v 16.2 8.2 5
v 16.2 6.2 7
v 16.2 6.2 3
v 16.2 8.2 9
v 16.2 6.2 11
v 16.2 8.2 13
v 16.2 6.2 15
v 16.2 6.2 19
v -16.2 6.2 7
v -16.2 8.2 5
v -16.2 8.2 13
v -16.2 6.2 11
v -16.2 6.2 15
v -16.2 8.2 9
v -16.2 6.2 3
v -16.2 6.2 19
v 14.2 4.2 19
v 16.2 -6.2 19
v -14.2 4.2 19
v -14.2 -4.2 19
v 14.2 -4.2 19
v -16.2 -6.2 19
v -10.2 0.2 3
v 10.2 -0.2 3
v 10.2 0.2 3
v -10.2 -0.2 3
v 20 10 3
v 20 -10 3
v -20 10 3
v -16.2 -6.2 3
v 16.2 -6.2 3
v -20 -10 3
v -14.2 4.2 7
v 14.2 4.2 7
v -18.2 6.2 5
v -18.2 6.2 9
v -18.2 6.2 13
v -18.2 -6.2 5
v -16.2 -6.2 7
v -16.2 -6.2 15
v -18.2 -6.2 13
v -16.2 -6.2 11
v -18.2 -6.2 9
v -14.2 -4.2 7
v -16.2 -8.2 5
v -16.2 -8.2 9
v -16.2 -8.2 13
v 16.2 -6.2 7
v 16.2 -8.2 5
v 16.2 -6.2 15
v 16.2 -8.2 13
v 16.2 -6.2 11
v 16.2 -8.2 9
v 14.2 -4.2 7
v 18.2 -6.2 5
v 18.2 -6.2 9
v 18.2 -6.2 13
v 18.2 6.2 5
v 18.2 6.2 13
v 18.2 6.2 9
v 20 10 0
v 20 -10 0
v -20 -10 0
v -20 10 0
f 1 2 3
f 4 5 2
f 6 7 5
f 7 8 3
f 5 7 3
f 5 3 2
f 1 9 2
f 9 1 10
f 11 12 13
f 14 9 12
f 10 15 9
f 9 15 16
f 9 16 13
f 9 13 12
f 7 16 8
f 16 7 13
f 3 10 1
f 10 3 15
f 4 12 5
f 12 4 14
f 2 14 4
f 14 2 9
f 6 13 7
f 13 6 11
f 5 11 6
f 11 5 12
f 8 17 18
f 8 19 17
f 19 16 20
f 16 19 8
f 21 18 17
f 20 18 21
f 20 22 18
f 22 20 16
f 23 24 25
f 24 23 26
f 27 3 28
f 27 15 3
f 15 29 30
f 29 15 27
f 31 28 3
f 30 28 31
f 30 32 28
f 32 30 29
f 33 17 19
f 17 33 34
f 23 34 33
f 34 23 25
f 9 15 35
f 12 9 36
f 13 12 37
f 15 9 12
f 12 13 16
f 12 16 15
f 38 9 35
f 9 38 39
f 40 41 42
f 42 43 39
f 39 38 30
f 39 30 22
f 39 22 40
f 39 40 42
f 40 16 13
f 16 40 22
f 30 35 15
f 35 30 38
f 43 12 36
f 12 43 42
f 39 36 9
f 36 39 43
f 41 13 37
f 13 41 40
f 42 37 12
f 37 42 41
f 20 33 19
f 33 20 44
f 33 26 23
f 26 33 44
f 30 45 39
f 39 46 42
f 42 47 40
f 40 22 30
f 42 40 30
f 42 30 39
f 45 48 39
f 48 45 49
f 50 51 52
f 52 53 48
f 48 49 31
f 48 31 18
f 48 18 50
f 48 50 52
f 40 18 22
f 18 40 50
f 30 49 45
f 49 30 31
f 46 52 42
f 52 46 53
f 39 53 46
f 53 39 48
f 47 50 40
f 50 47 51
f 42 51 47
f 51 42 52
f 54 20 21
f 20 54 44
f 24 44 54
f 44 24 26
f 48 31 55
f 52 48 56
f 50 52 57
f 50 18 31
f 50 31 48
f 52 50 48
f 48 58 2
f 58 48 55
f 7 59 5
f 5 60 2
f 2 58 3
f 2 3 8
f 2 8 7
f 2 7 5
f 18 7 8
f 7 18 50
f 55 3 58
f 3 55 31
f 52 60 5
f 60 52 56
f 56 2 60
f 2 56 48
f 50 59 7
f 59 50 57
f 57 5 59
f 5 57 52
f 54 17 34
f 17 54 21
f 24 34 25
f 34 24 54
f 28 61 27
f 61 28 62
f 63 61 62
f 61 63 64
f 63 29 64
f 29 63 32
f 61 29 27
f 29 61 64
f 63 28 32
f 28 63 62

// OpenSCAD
//EndCap_Print();
AluX = 40;
AluY = 20;
AluThickness = 1.8;
EndCapGraps = 3;
EndCapWallThickness = 2;
EndCapThickness = 3;



_WallLengthX = AluX-2*AluThickness-2*EndCapWallThickness;
_WallLengthY = AluY-2*AluThickness-2*EndCapWallThickness;


_Height = (EndCapGraps+1)*2*EndCapWallThickness;

EndCap_Print();

module EndCap()
{
	translate([0,0,-EndCapThickness])
	EndCap_Print();
}


module EndCap_Print()
{
	difference()
	{
		union()
		{
			//Bottom
			translate([0,0,0.5*EndCapThickness])
			cube([AluX, AluY, EndCapThickness], center=true);
			//Walls
            
			rotate([0,0,0*90])
            translate([	0,
                        0.5*AluY-2*EndCapWallThickness-AluThickness,
                        EndCapThickness])
            _wall(_WallLengthX);
            rotate([0,0,1*90])
            translate([	0,
                        0.5*AluX-2*EndCapWallThickness-AluThickness,
                        EndCapThickness])
            _wall(_WallLengthY);
            rotate([0,0,2*90])
            translate([	0,
                        0.5*AluY-2*EndCapWallThickness-AluThickness,
                        EndCapThickness])
            _wall(_WallLengthX);
            rotate([0,0,3*90])
            translate([	0,
                        0.5*AluX-2*EndCapWallThickness-AluThickness,
                        EndCapThickness])
            _wall(_WallLengthY); 
		}/*
		union()
		{
			_EndCapCut(AluX,AluY);
			rotate([0,0,90])
			_EndCapCut(AluY,AluX);
		}*/
	}
}

module _wall(length)
{
	//translate([	0,
	//				0.5*AluWidth-2*EndCapWallThickness-AluThickness,
	//				EndCapThickness])
	union()
	{
		translate([-0.5*length,0,0])
		cube([length, EndCapWallThickness, _Height]);
		_support(length);
		for ( i = [0 : EndCapGraps-1] )
		{
			  translate([0,0,i*2*EndCapWallThickness]) _wedge(length); 
		}
	}
}

module _wedge(length)
{
	translate([length*0.5,EndCapWallThickness,0])
	rotate([0,-90,0])
	linear_extrude(height=length)
	polygon(points=[[0,0],
					[EndCapWallThickness,EndCapWallThickness],
					[2*EndCapWallThickness,0]],paths=[ [0,1,2] ]);
}

module _support(length)
{
	rotate([0,0,180])
	translate([length*0.5-EndCapWallThickness+0.1,0,0])
	rotate([0,-90,0])
	linear_extrude(height=length-2*EndCapWallThickness+0.2)
	polygon(points=[[0,0],
					[EndCapWallThickness*2,0],
					[0,EndCapWallThickness*2]],paths=[ [0,1,2] ]);
}

module _EndCapCut(length, dist)
{
	translate([0,0,EndCapThickness+2*EndCapWallThickness])
	rotate([90,0,0])
	translate([0,0,-0.5*dist-EndCapWallThickness-0.1])
	linear_extrude(height=dist+2*EndCapWallThickness+0.2)
	polygon(points=[[0,0],
					[-0.5*length,_Height],
					[0.5*length,_Height]],paths=[ [0,1,2] ]);
}
